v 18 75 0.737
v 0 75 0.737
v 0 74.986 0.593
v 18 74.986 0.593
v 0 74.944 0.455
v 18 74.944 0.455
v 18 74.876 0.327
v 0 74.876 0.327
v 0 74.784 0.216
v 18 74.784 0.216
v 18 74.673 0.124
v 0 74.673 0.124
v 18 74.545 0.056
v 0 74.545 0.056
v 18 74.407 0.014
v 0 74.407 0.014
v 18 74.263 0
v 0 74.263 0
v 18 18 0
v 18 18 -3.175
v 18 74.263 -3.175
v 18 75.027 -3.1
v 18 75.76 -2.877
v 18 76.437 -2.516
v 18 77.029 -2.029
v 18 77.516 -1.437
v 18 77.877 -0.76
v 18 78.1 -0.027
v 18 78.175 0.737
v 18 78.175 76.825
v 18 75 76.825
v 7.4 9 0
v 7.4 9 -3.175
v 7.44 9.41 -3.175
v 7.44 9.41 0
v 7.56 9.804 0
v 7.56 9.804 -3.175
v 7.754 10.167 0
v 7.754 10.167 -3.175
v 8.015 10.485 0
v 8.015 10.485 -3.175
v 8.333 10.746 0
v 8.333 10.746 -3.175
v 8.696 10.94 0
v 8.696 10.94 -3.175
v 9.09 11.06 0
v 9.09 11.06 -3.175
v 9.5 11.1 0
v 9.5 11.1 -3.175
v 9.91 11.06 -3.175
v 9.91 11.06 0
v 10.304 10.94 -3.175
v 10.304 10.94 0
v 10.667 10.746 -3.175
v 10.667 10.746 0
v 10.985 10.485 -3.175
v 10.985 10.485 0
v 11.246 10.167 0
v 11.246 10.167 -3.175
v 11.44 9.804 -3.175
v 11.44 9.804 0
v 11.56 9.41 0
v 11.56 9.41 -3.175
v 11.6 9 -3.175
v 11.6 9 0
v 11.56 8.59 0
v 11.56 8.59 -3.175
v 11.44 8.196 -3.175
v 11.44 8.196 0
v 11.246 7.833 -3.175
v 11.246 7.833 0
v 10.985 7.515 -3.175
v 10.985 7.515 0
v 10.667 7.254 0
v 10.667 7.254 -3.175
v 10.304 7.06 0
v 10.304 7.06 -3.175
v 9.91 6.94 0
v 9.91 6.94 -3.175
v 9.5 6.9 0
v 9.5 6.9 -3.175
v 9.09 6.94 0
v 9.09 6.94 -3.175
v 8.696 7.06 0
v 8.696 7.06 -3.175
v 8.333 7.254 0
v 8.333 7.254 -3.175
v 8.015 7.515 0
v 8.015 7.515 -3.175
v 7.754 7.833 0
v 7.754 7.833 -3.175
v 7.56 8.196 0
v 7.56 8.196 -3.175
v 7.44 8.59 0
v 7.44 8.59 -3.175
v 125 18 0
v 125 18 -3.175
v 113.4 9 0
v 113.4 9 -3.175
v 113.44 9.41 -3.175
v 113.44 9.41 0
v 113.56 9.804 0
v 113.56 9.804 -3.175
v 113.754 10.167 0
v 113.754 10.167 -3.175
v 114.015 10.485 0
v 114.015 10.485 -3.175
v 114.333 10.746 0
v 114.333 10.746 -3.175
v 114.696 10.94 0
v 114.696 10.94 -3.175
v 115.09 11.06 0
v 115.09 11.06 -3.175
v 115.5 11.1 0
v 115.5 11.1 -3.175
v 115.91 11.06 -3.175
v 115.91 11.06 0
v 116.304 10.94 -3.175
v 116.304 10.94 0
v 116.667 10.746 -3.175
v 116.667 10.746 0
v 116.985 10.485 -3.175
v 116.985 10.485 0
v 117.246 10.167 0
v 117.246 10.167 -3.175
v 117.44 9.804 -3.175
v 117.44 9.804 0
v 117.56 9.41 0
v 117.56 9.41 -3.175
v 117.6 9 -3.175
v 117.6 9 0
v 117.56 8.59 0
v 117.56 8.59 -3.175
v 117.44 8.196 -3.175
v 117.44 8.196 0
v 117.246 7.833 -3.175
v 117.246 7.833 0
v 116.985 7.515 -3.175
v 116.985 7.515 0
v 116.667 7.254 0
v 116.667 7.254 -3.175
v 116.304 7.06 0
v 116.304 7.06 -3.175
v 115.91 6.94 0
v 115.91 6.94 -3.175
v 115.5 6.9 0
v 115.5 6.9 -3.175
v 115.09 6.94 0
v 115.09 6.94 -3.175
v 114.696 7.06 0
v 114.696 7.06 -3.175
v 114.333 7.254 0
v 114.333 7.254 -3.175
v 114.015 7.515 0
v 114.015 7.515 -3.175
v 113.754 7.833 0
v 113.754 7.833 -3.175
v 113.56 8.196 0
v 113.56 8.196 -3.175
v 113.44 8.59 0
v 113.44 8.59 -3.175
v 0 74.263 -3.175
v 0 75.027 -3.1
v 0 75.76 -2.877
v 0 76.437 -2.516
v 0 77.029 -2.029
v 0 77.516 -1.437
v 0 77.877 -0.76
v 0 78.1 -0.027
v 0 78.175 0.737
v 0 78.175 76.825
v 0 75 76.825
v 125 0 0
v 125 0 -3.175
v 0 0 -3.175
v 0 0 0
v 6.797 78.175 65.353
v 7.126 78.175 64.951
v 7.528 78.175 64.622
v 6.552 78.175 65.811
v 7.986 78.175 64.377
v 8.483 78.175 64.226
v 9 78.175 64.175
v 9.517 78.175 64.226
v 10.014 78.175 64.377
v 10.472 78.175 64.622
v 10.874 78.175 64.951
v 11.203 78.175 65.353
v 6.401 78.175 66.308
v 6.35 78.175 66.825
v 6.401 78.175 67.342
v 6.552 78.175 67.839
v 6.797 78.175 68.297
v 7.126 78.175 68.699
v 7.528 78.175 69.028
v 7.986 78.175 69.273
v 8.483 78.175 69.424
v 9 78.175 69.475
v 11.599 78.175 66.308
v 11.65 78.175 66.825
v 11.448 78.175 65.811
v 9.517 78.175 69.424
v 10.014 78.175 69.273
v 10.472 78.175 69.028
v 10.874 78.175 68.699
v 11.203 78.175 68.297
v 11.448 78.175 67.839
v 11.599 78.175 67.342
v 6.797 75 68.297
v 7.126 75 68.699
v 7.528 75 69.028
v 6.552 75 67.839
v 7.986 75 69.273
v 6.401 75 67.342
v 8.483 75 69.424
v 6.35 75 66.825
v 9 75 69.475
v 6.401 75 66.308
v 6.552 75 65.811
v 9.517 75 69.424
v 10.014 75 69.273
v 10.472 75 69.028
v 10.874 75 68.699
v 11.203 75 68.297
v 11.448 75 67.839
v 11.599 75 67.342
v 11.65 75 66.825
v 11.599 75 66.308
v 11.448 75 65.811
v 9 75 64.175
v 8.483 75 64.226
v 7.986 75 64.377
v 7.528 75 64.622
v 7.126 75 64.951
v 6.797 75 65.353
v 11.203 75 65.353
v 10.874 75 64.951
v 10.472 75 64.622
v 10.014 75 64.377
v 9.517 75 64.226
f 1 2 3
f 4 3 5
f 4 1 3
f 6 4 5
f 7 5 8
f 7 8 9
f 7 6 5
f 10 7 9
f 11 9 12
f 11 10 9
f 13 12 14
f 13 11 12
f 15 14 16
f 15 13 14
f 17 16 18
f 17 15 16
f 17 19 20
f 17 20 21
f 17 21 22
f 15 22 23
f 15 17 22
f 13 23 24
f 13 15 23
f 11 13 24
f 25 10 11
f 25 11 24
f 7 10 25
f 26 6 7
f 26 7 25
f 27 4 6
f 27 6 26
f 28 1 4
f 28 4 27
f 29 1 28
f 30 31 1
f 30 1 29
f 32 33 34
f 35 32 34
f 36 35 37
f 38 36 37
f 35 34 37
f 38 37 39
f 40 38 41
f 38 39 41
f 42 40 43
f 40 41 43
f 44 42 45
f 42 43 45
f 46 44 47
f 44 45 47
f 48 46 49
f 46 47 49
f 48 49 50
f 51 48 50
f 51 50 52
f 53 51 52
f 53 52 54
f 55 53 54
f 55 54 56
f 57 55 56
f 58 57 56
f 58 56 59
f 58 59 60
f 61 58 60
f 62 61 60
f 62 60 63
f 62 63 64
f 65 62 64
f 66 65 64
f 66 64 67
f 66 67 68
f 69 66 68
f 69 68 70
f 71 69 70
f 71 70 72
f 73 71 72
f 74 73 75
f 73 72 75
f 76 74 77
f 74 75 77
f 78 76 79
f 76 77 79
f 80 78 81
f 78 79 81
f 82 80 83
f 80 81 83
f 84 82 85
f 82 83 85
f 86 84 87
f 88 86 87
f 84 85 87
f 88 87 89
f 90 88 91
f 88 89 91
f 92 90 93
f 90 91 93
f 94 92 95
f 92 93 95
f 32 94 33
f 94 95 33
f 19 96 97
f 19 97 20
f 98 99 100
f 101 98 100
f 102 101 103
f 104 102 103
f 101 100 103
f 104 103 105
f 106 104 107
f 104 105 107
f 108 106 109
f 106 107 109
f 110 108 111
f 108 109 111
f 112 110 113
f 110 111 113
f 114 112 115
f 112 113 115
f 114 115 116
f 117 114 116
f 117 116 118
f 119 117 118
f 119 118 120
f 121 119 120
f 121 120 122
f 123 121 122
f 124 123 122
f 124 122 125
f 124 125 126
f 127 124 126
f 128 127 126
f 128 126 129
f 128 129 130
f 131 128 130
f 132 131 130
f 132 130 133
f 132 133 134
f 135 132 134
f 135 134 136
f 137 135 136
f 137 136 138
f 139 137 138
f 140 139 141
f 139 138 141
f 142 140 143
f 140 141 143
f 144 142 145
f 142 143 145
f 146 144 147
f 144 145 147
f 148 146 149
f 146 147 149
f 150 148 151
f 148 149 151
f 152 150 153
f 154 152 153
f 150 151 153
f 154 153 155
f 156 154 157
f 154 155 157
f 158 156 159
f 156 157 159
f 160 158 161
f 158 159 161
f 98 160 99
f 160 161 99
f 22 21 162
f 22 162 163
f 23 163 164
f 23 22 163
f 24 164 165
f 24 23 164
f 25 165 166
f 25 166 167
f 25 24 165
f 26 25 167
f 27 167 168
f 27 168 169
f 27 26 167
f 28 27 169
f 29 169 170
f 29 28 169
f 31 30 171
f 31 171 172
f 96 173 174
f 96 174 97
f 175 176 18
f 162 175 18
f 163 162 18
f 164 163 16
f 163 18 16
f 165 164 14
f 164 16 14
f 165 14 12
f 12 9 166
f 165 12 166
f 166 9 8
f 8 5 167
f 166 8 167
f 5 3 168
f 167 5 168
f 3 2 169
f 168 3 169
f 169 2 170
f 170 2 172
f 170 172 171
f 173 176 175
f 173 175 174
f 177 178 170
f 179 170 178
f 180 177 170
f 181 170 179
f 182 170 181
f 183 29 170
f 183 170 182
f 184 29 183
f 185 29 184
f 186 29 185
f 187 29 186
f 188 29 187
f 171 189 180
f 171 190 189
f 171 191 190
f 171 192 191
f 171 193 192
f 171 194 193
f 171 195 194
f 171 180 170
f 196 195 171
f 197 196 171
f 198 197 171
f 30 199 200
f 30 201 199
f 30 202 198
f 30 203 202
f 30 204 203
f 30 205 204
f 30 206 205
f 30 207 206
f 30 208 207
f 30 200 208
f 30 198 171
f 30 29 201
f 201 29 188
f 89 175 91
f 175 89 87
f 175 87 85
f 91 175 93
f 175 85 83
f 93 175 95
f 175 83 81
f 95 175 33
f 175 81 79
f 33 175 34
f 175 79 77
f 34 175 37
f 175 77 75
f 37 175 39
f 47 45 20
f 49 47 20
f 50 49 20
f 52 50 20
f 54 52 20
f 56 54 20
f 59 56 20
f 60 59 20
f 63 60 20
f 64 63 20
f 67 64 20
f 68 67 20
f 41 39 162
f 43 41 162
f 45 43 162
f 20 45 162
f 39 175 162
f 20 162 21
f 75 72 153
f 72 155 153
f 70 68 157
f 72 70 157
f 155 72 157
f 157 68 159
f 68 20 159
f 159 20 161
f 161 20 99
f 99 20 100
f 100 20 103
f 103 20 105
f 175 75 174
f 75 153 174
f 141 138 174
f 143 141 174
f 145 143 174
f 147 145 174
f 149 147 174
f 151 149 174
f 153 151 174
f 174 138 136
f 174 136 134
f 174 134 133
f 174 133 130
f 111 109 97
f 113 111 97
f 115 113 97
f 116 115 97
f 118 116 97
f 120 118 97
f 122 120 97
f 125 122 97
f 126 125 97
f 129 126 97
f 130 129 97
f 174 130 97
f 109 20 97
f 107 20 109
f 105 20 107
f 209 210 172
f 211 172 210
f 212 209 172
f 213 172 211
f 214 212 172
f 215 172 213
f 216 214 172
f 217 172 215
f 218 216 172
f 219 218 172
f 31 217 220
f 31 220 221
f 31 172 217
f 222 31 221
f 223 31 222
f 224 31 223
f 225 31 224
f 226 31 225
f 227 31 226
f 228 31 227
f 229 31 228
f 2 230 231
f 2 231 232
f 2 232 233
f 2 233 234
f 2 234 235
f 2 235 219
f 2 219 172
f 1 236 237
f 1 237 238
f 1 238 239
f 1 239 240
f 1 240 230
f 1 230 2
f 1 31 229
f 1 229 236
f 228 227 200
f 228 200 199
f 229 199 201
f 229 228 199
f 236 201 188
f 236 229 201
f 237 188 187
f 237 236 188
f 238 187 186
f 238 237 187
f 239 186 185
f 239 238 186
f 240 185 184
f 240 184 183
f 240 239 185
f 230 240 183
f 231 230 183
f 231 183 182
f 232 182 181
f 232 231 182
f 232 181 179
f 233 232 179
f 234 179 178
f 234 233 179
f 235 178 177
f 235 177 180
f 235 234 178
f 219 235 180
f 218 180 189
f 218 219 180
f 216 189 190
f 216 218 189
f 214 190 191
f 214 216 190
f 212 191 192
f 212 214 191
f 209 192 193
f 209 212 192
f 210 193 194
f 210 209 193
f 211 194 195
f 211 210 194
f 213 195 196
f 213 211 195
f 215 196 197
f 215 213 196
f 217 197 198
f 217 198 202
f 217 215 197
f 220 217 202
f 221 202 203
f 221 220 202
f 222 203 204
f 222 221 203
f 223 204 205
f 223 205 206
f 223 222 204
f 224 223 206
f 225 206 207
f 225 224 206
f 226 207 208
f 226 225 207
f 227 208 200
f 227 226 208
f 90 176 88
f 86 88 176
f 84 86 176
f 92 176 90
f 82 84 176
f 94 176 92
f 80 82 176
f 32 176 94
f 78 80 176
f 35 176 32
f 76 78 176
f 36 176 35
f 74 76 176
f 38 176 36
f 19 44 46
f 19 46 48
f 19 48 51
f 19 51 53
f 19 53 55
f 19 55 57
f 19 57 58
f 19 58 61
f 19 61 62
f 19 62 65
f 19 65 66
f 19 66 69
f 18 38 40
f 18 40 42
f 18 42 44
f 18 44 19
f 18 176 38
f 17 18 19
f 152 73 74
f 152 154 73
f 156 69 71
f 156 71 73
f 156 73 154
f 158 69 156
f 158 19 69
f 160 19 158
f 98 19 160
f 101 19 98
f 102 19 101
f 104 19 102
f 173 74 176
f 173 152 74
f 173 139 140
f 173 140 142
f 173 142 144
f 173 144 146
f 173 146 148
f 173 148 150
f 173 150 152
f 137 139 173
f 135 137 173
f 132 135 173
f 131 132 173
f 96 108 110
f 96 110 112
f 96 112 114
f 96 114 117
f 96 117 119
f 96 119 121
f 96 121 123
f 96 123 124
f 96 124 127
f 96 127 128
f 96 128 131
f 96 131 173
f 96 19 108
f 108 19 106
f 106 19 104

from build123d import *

# Parameters (mm, degrees)
BASE_FLANGE1_DEPTH           = 3.175
EDGE_FLANGE1_STRIP_W         = 14.1732
EDGE_FLANGE1_STRIP_H         = 3.175
EDGE_FLANGE1_STRIP_CUT_DEPTH = 18
EDGE_FLANGE1_DEPTH           = 18
M5X0_8_TAPPED_HOLE1_D        = 4.2
HOLE2_START                  = 75
HOLE2_OUTLINE_R              = 2.65
HOLE2_DEPTH                  = 3.175


# Read off the part's stored shape, not the designer's step: Hole2
# Sheet-metal steps are written as plain solids
with BuildPart() as part:
    # Sketch1 → Base-Flange1 (new body)
    with BuildSketch(Plane.XY):
        Polygon((0, 75), (0, 0), (125, 0), (125, 18), (18, 18), (18, 75), align=None)
    extrude(amount=-BASE_FLANGE1_DEPTH)

    # Edge-Flange1 strip (across the edge) → Edge-Flange1 strip cut (cut)
    with BuildSketch(Plane(origin=(18, 75, 0), x_dir=(0, -1, 0), z_dir=(-1, 0, 0))):
        with Locations((-6.35, -1.5875)):
            Rectangle(EDGE_FLANGE1_STRIP_W, EDGE_FLANGE1_STRIP_H)
    extrude(amount=EDGE_FLANGE1_STRIP_CUT_DEPTH, mode=Mode.SUBTRACT)

    # Edge-Flange1 section (across the edge) → Edge-Flange1 (add)
    with BuildSketch(Plane(origin=(18, 75, 0), x_dir=(0, -1, 0), z_dir=(-1, 0, 0))):
        with BuildLine():
            Line((-3.175, 0.7366), (-3.175, 76.825))
            Line((-3.175, 76.825), (0, 76.825))
            Line((0, 76.825), (0, 0.7366))
            ThreePointArc((0, 0.7366), (0.215745145, 0.215745145), (0.7366, 0))
            Line((0.7366, 0), (0.7366, -3.175))
            ThreePointArc((0.7366, -3.175), (-2.029318885, -2.029318885), (-3.175, 0.7366))
        make_face()
    extrude(amount=EDGE_FLANGE1_DEPTH)

    # M5x0.8 Tapped Hole1 (through all)
    with Locations(Plane.XY):
        with Locations((9.5, 9), (115.5, 9)):
            Hole(M5X0_8_TAPPED_HOLE1_D / 2)

    # Hole2 outline → Hole2 (cut)
    with BuildSketch(Plane(origin=(0, 0, 0), x_dir=(1, 0, 0), z_dir=(0, 1, 0)).offset(HOLE2_START)):
        with Locations((9, -66.825)):
            Circle(HOLE2_OUTLINE_R)
    extrude(amount=HOLE2_DEPTH, mode=Mode.SUBTRACT)


solid = part.part
